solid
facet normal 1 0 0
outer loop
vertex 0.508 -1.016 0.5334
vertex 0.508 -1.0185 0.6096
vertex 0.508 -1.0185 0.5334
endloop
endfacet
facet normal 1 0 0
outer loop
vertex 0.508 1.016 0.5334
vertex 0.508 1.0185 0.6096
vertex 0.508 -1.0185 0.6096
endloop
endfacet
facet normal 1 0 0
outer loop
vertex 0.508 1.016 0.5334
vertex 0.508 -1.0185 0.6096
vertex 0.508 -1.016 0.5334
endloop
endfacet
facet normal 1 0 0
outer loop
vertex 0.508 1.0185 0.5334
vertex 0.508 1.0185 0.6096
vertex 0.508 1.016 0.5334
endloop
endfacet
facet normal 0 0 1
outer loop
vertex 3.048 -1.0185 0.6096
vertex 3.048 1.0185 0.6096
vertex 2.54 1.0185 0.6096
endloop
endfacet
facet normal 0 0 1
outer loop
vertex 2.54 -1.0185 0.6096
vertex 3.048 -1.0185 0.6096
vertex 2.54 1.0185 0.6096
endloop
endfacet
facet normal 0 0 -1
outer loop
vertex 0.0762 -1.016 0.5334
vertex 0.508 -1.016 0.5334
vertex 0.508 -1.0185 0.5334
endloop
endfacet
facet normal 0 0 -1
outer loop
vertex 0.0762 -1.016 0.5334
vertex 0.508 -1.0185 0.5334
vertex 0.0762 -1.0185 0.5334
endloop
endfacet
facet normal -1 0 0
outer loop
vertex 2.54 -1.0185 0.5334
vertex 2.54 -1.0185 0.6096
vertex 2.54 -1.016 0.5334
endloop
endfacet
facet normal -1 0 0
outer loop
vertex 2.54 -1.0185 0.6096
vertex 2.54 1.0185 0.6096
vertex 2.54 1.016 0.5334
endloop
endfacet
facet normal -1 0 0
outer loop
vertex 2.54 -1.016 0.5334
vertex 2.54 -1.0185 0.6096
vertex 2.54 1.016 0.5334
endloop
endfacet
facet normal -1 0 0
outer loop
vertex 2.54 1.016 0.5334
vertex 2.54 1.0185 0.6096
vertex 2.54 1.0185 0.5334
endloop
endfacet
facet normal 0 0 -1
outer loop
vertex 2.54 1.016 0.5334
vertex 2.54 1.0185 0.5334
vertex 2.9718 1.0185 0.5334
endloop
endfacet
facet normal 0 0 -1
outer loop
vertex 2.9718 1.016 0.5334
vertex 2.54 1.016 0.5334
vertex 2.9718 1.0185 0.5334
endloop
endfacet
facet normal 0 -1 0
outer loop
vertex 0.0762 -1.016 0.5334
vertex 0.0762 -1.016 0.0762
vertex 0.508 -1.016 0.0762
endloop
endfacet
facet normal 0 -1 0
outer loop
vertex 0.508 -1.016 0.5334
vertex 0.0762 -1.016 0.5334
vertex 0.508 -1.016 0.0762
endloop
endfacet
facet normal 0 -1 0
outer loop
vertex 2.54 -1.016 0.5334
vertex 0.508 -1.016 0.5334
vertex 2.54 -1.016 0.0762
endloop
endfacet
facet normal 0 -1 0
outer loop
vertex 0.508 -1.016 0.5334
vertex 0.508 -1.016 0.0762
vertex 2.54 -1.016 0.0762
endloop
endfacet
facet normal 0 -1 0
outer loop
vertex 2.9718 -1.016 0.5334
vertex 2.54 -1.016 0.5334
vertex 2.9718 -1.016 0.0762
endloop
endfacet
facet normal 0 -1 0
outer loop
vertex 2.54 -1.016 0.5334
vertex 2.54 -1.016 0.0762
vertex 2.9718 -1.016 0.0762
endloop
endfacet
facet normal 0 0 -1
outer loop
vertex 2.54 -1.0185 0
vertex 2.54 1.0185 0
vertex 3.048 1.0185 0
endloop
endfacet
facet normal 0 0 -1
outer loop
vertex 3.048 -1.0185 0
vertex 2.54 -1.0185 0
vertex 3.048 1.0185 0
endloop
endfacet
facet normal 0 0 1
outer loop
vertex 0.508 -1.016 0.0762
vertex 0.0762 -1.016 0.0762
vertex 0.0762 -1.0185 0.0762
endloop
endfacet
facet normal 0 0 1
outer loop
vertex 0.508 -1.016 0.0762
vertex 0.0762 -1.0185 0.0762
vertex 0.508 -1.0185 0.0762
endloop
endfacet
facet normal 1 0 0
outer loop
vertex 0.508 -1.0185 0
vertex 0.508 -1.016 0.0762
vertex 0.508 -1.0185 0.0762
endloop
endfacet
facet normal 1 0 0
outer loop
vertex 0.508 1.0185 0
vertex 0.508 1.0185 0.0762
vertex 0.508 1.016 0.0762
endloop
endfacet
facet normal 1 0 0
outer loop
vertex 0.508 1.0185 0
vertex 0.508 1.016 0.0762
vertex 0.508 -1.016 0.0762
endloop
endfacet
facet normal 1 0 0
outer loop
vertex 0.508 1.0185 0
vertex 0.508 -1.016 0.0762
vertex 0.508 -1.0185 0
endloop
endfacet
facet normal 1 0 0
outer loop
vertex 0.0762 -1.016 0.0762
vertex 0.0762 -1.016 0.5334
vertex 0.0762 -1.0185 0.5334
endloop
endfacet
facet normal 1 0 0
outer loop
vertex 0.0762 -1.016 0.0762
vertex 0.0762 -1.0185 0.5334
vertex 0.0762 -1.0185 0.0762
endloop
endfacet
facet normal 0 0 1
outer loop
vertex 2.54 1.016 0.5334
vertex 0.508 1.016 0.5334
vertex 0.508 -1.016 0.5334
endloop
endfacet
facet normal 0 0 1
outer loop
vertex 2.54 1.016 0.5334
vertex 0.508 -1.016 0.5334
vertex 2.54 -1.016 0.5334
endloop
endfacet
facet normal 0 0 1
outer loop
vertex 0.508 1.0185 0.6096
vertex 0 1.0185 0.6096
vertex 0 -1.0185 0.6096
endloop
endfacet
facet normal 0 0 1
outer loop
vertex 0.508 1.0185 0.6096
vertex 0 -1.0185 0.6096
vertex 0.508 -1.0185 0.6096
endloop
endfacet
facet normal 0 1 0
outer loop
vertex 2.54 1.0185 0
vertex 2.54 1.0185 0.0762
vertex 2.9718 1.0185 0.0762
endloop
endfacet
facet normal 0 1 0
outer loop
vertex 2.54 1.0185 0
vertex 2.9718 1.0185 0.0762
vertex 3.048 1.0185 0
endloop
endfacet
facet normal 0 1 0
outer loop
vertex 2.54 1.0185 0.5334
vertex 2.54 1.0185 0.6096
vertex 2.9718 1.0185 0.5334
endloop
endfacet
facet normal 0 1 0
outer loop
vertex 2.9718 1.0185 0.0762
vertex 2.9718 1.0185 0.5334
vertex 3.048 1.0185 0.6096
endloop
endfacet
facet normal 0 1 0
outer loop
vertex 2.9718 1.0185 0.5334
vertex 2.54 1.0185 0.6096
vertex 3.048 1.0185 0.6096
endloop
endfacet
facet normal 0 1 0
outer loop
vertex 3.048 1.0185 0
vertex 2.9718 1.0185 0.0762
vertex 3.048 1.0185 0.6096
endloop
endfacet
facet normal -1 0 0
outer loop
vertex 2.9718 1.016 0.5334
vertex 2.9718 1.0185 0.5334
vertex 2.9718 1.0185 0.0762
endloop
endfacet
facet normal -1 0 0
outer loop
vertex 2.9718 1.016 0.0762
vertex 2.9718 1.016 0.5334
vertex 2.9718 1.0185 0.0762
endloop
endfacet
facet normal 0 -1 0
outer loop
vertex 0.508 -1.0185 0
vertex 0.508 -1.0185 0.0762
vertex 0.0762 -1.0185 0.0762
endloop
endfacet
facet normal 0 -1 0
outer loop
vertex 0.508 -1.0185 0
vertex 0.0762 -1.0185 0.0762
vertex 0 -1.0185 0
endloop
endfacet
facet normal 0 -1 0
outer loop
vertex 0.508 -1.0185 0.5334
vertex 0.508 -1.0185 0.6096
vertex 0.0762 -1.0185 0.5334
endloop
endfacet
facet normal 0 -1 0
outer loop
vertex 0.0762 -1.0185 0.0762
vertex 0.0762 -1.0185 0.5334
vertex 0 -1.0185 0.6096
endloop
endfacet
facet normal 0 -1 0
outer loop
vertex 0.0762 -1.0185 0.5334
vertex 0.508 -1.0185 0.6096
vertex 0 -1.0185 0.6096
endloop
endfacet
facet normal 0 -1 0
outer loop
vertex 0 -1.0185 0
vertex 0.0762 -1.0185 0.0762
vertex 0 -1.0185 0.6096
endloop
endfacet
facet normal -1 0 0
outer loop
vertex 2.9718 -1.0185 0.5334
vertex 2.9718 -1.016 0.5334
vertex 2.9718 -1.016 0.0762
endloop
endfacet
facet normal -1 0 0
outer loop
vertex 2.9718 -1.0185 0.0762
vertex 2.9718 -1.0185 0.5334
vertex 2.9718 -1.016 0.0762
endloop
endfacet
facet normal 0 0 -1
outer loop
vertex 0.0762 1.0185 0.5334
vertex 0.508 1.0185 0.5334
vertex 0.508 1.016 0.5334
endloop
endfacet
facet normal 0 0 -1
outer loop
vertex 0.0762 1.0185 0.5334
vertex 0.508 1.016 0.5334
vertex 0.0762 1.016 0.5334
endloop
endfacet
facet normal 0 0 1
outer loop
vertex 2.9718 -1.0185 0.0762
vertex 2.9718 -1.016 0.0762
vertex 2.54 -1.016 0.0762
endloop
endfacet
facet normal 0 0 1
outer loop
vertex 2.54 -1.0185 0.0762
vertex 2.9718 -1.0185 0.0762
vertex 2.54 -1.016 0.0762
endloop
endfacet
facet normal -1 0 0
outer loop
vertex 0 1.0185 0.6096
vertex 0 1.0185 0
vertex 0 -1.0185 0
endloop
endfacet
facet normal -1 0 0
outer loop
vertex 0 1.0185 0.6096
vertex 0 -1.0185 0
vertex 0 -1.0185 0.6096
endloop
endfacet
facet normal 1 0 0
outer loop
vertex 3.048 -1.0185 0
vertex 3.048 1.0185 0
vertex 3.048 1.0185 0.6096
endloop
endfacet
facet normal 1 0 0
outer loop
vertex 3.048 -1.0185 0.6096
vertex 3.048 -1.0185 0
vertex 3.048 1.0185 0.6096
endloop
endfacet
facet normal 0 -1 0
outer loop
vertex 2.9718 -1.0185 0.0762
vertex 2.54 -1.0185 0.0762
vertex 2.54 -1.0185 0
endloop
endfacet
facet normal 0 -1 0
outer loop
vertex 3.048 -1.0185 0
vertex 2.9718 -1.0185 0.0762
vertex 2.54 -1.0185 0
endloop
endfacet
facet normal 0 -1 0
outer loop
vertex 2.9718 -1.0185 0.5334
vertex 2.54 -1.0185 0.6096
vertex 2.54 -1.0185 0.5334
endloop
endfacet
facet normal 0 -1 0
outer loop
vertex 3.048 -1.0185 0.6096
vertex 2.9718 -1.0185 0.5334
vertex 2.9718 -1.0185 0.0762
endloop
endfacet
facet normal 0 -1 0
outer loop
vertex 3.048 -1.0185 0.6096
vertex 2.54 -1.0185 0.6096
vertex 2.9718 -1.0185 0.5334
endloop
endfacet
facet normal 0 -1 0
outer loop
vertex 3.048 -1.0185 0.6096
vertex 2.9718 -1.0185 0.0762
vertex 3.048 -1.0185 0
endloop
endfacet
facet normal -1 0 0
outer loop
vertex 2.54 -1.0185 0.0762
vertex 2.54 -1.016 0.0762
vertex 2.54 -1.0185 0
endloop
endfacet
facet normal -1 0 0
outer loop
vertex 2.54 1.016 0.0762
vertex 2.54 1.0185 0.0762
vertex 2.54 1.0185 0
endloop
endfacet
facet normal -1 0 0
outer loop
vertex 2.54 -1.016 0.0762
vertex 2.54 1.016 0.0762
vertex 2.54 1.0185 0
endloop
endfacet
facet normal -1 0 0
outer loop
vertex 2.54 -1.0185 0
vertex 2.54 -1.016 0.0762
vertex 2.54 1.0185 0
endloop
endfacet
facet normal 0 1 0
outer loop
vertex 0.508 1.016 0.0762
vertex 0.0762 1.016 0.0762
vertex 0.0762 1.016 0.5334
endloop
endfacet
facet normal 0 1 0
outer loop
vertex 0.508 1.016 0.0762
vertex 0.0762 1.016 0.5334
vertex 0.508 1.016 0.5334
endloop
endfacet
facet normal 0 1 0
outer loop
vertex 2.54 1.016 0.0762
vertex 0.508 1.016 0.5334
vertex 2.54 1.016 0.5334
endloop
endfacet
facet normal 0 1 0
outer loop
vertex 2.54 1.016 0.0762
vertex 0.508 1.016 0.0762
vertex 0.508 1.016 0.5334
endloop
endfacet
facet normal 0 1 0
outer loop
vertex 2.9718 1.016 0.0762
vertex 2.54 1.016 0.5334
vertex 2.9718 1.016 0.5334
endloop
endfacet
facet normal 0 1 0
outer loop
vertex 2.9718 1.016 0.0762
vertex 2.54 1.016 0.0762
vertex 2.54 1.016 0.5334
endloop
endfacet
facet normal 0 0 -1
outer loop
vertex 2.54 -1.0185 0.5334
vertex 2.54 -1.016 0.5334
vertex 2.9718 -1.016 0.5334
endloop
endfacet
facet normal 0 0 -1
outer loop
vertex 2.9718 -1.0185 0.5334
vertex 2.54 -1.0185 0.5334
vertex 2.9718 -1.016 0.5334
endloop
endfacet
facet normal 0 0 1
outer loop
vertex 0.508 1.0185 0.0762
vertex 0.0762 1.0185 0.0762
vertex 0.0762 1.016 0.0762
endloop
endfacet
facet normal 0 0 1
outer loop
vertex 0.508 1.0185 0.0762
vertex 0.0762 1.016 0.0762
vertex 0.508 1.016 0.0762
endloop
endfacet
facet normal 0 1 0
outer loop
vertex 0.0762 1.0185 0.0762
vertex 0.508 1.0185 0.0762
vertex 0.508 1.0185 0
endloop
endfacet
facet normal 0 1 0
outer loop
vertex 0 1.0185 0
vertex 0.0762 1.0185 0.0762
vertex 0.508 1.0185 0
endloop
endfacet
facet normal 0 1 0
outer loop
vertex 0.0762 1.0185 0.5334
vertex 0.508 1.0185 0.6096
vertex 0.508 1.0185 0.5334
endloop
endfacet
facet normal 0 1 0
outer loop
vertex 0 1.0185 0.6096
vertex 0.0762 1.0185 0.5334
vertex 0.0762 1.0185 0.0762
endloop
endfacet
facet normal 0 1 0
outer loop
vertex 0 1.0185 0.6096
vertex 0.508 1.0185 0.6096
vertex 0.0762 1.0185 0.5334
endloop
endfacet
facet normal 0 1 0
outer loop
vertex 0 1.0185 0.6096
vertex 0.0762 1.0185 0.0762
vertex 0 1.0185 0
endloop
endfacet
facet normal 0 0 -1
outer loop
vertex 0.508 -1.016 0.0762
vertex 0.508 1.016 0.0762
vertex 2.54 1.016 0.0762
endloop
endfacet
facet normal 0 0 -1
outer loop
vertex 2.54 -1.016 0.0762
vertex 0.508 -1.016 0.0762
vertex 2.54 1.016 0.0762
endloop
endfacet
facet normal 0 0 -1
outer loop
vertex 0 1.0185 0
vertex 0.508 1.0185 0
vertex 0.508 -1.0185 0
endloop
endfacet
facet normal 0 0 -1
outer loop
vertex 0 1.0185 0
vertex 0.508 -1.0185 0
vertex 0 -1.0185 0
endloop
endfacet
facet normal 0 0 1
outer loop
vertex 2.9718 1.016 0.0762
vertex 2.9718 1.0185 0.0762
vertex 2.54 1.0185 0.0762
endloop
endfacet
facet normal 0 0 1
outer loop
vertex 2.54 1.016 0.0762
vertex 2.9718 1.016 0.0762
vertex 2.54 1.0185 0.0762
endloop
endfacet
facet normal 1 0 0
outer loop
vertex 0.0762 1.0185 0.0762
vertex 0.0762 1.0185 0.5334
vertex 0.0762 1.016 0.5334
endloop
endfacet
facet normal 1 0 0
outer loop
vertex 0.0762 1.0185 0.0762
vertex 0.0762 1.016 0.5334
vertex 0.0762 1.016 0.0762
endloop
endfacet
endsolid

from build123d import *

# Parameters (mm, degrees)
SKETCH2_W           = 2.8956
SKETCH2_H           = 0.4572
BASE_EXTRUDE_DEPTH  = 1.016
BOSS_EXTRUDE8_DEPTH = 2.03708


with BuildPart() as part:
    # Sketch2 → Base-Extrude (new body, symmetric)
    with BuildSketch(Plane(origin=(0, 0, 0), x_dir=(1, 0, 0), z_dir=(0, 1, 0))):
        with Locations((1.524, -0.3048)):
            Rectangle(SKETCH2_W, SKETCH2_H)
    extrude(amount=BASE_EXTRUDE_DEPTH, both=True)

    # Sketch3 → Boss-Extrude8 (add)
    with BuildSketch(Plane(origin=(0, 1.01854, 0), x_dir=(-1, 0, 0), z_dir=(0, 1, 0))):
        Polygon((-0.508, 0.6096), (-0.508, 0.5334), (-0.0762, 0.5334), (-0.0762, 0.0762), (-0.508, 0.0762), (-0.508, 0), (0, 0), (0, 0.6096), align=None)
    boss_extrude8 = extrude(amount=-BOSS_EXTRUDE8_DEPTH)

    # Mirror5: Boss-Extrude8 across plane
    add(boss_extrude8.mirror(Plane(origin=(1.524, 0, 0), x_dir=(0, 0, 1), z_dir=(1, 0, 0))))


solid = part.part
